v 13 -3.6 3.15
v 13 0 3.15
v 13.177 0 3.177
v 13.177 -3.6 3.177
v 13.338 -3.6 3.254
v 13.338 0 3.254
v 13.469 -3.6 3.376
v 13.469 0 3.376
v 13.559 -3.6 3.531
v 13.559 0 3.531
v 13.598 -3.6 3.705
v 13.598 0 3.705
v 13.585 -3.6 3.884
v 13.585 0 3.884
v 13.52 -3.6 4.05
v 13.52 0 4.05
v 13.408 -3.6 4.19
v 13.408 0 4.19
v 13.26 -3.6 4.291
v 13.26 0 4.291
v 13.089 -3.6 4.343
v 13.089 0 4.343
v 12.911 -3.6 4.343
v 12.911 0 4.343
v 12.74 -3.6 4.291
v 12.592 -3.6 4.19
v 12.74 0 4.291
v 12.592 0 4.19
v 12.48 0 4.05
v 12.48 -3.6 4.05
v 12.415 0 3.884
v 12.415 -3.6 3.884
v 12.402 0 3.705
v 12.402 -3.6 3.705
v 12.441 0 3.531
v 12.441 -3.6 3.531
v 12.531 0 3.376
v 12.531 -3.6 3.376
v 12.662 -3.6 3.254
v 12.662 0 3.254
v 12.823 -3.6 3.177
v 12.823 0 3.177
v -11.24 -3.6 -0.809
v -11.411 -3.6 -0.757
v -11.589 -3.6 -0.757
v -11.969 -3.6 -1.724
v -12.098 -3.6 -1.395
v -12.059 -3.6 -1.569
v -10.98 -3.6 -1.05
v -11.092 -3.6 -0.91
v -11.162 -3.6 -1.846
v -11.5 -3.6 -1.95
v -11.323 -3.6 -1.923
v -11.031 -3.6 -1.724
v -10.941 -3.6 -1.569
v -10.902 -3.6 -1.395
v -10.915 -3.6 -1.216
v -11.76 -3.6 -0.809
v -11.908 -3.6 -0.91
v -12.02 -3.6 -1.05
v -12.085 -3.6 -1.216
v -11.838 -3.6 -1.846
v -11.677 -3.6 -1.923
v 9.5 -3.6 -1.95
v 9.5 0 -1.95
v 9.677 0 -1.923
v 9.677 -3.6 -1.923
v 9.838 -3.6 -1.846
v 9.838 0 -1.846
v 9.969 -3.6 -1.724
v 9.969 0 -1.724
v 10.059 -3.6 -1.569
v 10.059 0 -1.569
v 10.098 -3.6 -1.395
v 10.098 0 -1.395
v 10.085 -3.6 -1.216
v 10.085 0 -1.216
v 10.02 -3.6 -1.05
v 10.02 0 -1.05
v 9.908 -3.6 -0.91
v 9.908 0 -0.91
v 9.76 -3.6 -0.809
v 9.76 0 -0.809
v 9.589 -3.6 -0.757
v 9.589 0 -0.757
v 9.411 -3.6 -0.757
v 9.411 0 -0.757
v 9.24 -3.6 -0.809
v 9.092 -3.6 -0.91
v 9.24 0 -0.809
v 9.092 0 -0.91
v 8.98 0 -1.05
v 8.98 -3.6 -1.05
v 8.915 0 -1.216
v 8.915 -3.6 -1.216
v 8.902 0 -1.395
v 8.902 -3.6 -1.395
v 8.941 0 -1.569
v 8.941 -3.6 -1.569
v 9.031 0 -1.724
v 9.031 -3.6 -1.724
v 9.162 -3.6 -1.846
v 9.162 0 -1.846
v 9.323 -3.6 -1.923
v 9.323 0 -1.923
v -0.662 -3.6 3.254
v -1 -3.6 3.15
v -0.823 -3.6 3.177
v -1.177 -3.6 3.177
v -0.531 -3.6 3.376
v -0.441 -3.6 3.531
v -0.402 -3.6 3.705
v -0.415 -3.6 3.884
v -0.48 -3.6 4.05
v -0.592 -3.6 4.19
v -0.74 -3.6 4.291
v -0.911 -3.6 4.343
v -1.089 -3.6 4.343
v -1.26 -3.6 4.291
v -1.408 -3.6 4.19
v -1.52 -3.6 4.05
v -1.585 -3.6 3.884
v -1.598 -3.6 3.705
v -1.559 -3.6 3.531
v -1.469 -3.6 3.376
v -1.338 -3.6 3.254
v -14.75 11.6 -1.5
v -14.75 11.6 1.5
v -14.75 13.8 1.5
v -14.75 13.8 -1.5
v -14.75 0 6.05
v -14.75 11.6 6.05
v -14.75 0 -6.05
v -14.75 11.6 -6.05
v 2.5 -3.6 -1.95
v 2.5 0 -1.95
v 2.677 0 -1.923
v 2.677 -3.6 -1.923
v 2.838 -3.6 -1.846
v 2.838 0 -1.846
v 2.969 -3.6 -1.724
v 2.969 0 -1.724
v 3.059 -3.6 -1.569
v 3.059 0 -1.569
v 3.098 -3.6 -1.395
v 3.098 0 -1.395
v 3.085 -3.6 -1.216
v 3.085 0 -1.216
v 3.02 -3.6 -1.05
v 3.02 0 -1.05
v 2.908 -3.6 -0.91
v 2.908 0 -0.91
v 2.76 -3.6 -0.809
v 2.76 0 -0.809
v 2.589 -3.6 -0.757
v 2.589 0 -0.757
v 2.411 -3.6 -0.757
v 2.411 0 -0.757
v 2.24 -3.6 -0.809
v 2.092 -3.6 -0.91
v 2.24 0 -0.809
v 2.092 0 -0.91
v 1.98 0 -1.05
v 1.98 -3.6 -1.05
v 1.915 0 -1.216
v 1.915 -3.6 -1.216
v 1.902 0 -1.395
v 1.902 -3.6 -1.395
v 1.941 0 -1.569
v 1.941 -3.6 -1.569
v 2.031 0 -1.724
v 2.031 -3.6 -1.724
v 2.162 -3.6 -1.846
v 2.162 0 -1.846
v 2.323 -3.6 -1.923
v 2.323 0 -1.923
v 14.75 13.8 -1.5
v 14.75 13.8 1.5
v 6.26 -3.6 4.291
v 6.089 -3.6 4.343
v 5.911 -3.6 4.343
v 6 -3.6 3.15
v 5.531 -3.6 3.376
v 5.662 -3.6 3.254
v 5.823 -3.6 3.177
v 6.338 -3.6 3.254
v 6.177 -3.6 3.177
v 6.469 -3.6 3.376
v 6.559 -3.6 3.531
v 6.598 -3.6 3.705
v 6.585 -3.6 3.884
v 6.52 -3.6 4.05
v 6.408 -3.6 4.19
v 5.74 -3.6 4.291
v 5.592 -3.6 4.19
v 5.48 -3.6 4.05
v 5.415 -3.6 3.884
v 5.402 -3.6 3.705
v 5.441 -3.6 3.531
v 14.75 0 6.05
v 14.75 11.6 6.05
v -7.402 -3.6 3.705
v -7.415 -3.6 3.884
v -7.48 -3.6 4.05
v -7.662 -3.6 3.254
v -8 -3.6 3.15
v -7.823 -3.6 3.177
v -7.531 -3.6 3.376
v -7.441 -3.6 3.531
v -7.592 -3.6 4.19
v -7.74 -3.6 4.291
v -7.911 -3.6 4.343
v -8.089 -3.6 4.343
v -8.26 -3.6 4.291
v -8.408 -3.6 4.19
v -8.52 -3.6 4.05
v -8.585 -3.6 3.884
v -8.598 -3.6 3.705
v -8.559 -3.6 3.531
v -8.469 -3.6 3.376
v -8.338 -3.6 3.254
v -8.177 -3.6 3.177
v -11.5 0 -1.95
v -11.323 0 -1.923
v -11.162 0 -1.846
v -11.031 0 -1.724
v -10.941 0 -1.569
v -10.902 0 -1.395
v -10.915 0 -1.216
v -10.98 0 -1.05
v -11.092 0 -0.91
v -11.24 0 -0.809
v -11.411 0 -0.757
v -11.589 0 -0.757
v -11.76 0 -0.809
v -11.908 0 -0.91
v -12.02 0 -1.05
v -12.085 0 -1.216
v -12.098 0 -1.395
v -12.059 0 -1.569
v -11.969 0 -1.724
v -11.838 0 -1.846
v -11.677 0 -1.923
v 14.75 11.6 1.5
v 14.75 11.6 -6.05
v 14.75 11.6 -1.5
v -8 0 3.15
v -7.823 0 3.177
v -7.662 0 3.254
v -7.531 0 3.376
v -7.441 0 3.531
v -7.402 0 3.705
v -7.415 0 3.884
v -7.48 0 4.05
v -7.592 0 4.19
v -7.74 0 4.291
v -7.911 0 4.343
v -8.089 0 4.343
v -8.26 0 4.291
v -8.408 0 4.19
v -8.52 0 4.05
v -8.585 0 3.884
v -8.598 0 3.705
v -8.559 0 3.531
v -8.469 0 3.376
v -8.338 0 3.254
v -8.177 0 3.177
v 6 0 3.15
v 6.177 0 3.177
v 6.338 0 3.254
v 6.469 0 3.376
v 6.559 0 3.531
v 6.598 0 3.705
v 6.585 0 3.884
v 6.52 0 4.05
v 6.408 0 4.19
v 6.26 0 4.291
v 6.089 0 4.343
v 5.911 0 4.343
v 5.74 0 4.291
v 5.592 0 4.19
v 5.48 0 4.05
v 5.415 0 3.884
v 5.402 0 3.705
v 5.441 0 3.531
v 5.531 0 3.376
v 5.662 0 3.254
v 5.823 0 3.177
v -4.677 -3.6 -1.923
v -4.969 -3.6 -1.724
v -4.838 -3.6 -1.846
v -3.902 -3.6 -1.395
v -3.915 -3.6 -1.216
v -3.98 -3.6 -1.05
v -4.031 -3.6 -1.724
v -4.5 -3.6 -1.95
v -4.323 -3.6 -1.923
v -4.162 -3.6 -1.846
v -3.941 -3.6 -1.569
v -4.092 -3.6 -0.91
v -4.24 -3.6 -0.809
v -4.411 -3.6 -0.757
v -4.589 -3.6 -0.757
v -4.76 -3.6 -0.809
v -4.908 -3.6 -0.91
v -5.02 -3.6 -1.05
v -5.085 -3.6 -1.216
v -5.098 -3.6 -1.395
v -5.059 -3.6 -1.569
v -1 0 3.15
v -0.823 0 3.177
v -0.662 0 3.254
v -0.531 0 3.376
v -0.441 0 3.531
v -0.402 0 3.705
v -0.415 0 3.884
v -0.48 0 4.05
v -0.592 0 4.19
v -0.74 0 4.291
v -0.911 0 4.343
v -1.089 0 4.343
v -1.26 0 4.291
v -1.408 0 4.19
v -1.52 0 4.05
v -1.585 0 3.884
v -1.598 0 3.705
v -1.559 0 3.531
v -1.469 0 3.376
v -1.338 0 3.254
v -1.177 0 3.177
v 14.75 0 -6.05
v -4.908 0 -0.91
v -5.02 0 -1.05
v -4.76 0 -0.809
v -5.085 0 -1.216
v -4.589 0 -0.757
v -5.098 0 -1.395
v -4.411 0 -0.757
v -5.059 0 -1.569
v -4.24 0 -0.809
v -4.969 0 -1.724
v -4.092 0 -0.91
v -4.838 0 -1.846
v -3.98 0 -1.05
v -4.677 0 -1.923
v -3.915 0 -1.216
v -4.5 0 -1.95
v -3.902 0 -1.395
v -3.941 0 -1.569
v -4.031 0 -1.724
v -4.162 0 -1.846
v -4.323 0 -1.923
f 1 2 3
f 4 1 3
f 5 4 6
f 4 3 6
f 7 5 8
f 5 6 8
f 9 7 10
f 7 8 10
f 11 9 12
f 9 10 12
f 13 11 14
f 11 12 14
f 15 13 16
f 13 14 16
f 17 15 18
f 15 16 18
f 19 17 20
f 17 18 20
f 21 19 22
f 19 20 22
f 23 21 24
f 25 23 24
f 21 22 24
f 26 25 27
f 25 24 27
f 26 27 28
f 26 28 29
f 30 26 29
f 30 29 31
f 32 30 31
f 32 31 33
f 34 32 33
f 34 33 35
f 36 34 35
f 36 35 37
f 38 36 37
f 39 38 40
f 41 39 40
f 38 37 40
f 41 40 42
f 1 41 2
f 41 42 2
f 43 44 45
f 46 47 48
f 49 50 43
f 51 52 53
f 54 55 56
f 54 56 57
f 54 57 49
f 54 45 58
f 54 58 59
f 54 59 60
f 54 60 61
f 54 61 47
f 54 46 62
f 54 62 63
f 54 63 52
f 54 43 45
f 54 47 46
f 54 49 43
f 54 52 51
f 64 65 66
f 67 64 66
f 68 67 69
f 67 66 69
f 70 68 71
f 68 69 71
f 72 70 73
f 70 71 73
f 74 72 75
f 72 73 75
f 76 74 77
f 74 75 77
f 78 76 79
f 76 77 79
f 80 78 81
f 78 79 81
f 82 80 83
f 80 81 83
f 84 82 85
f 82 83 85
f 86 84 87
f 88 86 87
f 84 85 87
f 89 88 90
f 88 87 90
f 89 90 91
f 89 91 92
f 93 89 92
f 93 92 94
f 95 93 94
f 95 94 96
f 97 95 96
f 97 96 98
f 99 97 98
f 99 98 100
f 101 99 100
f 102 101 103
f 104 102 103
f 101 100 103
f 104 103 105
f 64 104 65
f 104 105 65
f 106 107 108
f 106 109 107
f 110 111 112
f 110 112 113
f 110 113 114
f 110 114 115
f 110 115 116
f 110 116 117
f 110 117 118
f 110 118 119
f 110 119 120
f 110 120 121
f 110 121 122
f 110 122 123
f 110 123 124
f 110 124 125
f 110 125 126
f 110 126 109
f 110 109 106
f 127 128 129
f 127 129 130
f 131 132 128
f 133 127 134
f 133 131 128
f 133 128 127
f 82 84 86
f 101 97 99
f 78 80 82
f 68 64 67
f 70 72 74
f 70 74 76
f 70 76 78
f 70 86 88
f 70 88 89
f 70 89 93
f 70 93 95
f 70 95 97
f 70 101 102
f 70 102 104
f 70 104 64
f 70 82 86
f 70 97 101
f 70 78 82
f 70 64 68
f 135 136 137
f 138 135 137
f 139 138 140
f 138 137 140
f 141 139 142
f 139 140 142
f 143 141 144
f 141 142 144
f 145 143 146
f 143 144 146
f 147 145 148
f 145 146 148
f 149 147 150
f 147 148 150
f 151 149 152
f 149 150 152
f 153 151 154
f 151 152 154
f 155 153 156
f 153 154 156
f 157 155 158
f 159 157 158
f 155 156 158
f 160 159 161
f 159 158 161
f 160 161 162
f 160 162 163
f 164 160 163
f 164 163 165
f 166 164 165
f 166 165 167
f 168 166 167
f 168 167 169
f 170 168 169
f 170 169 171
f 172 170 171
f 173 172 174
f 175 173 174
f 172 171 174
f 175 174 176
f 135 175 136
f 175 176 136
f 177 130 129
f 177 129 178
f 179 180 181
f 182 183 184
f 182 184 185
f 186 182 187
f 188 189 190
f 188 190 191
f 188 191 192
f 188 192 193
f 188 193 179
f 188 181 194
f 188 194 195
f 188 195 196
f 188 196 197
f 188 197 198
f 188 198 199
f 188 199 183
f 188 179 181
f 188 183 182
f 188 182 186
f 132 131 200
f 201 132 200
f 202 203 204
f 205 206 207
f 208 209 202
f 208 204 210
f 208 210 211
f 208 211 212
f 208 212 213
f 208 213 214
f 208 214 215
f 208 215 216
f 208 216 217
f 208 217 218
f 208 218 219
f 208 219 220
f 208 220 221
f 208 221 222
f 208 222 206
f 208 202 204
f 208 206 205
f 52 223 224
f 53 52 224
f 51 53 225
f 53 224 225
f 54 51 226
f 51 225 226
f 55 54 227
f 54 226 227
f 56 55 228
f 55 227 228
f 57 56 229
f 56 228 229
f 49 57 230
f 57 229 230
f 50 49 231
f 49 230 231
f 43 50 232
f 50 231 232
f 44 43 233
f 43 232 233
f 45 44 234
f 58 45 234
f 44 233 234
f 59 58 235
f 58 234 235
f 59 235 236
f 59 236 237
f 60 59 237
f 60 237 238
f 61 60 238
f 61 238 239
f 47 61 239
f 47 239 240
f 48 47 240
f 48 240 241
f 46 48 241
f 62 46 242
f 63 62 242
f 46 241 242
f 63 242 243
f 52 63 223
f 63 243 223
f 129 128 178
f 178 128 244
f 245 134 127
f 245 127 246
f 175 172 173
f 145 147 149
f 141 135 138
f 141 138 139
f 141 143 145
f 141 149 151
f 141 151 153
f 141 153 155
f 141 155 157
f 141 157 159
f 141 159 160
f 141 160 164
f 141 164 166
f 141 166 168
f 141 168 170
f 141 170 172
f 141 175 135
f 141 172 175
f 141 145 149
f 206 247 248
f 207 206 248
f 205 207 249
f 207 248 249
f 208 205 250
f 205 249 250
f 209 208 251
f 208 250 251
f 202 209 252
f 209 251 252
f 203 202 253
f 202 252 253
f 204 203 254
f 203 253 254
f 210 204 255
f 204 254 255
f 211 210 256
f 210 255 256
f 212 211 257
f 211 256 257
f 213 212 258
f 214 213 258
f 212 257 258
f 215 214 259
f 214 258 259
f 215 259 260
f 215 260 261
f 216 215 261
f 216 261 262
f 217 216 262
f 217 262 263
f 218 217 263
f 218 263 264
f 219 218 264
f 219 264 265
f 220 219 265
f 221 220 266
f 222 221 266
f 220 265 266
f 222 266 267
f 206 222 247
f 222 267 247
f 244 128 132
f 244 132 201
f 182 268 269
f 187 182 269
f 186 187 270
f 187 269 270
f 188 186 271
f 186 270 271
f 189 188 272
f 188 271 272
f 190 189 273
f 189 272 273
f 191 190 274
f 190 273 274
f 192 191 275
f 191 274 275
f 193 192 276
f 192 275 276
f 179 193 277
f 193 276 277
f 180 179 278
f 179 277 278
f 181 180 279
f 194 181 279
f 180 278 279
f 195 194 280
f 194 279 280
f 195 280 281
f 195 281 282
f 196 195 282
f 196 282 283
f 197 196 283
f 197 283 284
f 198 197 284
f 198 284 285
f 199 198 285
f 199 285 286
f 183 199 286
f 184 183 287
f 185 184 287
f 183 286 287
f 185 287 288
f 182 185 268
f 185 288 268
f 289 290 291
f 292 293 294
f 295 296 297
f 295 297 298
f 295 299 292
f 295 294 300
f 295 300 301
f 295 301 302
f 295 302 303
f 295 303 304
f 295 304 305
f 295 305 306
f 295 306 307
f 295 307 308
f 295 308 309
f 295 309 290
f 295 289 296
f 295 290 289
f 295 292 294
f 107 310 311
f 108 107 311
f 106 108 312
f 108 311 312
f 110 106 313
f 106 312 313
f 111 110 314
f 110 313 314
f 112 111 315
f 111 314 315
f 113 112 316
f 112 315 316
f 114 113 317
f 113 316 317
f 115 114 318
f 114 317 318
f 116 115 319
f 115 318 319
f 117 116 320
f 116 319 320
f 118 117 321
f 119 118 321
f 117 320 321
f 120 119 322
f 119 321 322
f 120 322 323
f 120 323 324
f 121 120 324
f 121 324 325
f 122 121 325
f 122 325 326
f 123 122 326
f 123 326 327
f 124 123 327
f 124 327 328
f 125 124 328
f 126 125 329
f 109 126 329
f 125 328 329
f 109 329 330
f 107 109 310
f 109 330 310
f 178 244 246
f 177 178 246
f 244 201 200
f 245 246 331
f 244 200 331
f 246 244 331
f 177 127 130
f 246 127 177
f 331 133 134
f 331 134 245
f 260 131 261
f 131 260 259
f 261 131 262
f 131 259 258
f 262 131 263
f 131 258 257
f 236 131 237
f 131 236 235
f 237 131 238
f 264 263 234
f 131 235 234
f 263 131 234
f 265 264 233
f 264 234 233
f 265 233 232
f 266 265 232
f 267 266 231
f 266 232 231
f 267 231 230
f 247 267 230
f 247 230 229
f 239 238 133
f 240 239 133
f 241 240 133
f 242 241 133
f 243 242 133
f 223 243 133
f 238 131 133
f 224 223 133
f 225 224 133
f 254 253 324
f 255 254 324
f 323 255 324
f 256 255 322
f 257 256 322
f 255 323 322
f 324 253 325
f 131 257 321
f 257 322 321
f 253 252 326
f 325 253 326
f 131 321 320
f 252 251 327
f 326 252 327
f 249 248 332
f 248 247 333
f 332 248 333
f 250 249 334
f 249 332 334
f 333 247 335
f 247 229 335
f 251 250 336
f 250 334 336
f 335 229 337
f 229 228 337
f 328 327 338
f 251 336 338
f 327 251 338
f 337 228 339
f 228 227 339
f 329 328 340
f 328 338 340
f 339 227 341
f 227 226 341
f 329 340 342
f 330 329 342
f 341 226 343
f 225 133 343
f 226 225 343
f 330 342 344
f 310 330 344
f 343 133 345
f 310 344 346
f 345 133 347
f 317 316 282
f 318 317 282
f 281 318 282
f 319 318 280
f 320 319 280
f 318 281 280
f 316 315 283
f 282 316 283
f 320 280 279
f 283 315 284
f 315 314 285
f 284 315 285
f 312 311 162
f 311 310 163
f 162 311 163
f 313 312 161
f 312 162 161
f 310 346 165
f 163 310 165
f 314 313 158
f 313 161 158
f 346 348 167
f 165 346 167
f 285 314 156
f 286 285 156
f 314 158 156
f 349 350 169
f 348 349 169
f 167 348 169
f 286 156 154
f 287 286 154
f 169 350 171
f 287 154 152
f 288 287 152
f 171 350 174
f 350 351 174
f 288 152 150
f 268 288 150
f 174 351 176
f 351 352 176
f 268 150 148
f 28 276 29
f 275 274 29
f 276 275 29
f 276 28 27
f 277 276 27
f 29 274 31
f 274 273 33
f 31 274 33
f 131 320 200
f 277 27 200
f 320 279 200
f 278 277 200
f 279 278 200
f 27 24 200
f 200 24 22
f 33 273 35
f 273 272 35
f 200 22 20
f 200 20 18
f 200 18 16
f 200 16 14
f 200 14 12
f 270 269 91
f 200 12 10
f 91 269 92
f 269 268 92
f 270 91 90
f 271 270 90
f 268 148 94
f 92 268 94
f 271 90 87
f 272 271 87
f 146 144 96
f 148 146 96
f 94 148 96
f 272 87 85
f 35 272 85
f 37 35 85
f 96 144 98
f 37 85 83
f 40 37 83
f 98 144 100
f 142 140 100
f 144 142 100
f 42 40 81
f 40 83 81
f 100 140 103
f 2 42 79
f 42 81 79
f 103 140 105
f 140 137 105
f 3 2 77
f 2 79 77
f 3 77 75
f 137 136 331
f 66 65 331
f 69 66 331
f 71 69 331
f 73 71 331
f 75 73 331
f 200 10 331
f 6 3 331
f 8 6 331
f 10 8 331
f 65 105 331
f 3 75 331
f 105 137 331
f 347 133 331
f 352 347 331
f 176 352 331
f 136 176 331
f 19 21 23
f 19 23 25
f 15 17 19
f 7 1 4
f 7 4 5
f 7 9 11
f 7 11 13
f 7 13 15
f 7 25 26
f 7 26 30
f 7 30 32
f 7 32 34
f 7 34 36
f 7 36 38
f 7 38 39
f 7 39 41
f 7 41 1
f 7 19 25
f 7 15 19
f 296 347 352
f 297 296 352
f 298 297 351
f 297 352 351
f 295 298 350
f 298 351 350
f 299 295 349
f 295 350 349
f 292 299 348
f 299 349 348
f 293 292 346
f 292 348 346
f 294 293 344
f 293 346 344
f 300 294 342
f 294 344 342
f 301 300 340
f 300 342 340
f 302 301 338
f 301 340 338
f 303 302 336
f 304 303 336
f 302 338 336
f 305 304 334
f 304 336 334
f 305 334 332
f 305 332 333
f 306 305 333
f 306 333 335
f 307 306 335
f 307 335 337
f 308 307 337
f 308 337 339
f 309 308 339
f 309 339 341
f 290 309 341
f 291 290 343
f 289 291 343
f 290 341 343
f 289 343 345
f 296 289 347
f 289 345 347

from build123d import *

# Parameters (mm, degrees)
CROQUIS1_W              = 29.5
CROQUIS1_H              = 12.1
SALIENTE_EXTRUIR1_DEPTH = 11.6
CROQUIS2_W              = 29.5
CROQUIS2_H              = 3
SALIENTE_EXTRUIR2_DEPTH = 2.2
CROQUIS3_R              = 0.6
SALIENTE_EXTRUIR3_DEPTH = 3.6


with BuildPart() as part:
    # Croquis1 → Saliente-Extruir1 (new body)
    with BuildSketch(Plane(origin=(0, 0, 0), x_dir=(1, 0, 0), z_dir=(0, 1, 0))):
        Rectangle(CROQUIS1_W, CROQUIS1_H)
    extrude(amount=SALIENTE_EXTRUIR1_DEPTH)

    # Croquis2 → Saliente-Extruir2 (add)
    with BuildSketch(Plane(origin=(0, 11.6, 0), x_dir=(1, 0, 0), z_dir=(0, 1, 0))):
        Rectangle(CROQUIS2_W, CROQUIS2_H)
    extrude(amount=SALIENTE_EXTRUIR2_DEPTH)

    # Croquis3 → Saliente-Extruir3 (add)
    with BuildSketch(Plane.XZ):
        with Locations(Location((-11.5, -1.35, 0), (0, 0, 270))):
            Circle(CROQUIS3_R)
        with Locations(Location((-8, 3.75, 0), (0, 0, 270))):
            Circle(CROQUIS3_R)
        with Locations(Location((-4.5, -1.35, 0), (0, 0, 270))):
            Circle(CROQUIS3_R)
        with Locations(Location((-1, 3.75, 0), (0, 0, 270))):
            Circle(CROQUIS3_R)
        with Locations(Location((2.5, -1.35, 0), (0, 0, 270))):
            Circle(CROQUIS3_R)
        with Locations(Location((6, 3.75, 0), (0, 0, 270))):
            Circle(CROQUIS3_R)
        with Locations(Location((9.5, -1.35, 0), (0, 0, 270))):
            Circle(CROQUIS3_R)
        with Locations(Location((13, 3.75, 0), (0, 0, 270))):
            Circle(CROQUIS3_R)
    extrude(amount=SALIENTE_EXTRUIR3_DEPTH)


solid = part.part
